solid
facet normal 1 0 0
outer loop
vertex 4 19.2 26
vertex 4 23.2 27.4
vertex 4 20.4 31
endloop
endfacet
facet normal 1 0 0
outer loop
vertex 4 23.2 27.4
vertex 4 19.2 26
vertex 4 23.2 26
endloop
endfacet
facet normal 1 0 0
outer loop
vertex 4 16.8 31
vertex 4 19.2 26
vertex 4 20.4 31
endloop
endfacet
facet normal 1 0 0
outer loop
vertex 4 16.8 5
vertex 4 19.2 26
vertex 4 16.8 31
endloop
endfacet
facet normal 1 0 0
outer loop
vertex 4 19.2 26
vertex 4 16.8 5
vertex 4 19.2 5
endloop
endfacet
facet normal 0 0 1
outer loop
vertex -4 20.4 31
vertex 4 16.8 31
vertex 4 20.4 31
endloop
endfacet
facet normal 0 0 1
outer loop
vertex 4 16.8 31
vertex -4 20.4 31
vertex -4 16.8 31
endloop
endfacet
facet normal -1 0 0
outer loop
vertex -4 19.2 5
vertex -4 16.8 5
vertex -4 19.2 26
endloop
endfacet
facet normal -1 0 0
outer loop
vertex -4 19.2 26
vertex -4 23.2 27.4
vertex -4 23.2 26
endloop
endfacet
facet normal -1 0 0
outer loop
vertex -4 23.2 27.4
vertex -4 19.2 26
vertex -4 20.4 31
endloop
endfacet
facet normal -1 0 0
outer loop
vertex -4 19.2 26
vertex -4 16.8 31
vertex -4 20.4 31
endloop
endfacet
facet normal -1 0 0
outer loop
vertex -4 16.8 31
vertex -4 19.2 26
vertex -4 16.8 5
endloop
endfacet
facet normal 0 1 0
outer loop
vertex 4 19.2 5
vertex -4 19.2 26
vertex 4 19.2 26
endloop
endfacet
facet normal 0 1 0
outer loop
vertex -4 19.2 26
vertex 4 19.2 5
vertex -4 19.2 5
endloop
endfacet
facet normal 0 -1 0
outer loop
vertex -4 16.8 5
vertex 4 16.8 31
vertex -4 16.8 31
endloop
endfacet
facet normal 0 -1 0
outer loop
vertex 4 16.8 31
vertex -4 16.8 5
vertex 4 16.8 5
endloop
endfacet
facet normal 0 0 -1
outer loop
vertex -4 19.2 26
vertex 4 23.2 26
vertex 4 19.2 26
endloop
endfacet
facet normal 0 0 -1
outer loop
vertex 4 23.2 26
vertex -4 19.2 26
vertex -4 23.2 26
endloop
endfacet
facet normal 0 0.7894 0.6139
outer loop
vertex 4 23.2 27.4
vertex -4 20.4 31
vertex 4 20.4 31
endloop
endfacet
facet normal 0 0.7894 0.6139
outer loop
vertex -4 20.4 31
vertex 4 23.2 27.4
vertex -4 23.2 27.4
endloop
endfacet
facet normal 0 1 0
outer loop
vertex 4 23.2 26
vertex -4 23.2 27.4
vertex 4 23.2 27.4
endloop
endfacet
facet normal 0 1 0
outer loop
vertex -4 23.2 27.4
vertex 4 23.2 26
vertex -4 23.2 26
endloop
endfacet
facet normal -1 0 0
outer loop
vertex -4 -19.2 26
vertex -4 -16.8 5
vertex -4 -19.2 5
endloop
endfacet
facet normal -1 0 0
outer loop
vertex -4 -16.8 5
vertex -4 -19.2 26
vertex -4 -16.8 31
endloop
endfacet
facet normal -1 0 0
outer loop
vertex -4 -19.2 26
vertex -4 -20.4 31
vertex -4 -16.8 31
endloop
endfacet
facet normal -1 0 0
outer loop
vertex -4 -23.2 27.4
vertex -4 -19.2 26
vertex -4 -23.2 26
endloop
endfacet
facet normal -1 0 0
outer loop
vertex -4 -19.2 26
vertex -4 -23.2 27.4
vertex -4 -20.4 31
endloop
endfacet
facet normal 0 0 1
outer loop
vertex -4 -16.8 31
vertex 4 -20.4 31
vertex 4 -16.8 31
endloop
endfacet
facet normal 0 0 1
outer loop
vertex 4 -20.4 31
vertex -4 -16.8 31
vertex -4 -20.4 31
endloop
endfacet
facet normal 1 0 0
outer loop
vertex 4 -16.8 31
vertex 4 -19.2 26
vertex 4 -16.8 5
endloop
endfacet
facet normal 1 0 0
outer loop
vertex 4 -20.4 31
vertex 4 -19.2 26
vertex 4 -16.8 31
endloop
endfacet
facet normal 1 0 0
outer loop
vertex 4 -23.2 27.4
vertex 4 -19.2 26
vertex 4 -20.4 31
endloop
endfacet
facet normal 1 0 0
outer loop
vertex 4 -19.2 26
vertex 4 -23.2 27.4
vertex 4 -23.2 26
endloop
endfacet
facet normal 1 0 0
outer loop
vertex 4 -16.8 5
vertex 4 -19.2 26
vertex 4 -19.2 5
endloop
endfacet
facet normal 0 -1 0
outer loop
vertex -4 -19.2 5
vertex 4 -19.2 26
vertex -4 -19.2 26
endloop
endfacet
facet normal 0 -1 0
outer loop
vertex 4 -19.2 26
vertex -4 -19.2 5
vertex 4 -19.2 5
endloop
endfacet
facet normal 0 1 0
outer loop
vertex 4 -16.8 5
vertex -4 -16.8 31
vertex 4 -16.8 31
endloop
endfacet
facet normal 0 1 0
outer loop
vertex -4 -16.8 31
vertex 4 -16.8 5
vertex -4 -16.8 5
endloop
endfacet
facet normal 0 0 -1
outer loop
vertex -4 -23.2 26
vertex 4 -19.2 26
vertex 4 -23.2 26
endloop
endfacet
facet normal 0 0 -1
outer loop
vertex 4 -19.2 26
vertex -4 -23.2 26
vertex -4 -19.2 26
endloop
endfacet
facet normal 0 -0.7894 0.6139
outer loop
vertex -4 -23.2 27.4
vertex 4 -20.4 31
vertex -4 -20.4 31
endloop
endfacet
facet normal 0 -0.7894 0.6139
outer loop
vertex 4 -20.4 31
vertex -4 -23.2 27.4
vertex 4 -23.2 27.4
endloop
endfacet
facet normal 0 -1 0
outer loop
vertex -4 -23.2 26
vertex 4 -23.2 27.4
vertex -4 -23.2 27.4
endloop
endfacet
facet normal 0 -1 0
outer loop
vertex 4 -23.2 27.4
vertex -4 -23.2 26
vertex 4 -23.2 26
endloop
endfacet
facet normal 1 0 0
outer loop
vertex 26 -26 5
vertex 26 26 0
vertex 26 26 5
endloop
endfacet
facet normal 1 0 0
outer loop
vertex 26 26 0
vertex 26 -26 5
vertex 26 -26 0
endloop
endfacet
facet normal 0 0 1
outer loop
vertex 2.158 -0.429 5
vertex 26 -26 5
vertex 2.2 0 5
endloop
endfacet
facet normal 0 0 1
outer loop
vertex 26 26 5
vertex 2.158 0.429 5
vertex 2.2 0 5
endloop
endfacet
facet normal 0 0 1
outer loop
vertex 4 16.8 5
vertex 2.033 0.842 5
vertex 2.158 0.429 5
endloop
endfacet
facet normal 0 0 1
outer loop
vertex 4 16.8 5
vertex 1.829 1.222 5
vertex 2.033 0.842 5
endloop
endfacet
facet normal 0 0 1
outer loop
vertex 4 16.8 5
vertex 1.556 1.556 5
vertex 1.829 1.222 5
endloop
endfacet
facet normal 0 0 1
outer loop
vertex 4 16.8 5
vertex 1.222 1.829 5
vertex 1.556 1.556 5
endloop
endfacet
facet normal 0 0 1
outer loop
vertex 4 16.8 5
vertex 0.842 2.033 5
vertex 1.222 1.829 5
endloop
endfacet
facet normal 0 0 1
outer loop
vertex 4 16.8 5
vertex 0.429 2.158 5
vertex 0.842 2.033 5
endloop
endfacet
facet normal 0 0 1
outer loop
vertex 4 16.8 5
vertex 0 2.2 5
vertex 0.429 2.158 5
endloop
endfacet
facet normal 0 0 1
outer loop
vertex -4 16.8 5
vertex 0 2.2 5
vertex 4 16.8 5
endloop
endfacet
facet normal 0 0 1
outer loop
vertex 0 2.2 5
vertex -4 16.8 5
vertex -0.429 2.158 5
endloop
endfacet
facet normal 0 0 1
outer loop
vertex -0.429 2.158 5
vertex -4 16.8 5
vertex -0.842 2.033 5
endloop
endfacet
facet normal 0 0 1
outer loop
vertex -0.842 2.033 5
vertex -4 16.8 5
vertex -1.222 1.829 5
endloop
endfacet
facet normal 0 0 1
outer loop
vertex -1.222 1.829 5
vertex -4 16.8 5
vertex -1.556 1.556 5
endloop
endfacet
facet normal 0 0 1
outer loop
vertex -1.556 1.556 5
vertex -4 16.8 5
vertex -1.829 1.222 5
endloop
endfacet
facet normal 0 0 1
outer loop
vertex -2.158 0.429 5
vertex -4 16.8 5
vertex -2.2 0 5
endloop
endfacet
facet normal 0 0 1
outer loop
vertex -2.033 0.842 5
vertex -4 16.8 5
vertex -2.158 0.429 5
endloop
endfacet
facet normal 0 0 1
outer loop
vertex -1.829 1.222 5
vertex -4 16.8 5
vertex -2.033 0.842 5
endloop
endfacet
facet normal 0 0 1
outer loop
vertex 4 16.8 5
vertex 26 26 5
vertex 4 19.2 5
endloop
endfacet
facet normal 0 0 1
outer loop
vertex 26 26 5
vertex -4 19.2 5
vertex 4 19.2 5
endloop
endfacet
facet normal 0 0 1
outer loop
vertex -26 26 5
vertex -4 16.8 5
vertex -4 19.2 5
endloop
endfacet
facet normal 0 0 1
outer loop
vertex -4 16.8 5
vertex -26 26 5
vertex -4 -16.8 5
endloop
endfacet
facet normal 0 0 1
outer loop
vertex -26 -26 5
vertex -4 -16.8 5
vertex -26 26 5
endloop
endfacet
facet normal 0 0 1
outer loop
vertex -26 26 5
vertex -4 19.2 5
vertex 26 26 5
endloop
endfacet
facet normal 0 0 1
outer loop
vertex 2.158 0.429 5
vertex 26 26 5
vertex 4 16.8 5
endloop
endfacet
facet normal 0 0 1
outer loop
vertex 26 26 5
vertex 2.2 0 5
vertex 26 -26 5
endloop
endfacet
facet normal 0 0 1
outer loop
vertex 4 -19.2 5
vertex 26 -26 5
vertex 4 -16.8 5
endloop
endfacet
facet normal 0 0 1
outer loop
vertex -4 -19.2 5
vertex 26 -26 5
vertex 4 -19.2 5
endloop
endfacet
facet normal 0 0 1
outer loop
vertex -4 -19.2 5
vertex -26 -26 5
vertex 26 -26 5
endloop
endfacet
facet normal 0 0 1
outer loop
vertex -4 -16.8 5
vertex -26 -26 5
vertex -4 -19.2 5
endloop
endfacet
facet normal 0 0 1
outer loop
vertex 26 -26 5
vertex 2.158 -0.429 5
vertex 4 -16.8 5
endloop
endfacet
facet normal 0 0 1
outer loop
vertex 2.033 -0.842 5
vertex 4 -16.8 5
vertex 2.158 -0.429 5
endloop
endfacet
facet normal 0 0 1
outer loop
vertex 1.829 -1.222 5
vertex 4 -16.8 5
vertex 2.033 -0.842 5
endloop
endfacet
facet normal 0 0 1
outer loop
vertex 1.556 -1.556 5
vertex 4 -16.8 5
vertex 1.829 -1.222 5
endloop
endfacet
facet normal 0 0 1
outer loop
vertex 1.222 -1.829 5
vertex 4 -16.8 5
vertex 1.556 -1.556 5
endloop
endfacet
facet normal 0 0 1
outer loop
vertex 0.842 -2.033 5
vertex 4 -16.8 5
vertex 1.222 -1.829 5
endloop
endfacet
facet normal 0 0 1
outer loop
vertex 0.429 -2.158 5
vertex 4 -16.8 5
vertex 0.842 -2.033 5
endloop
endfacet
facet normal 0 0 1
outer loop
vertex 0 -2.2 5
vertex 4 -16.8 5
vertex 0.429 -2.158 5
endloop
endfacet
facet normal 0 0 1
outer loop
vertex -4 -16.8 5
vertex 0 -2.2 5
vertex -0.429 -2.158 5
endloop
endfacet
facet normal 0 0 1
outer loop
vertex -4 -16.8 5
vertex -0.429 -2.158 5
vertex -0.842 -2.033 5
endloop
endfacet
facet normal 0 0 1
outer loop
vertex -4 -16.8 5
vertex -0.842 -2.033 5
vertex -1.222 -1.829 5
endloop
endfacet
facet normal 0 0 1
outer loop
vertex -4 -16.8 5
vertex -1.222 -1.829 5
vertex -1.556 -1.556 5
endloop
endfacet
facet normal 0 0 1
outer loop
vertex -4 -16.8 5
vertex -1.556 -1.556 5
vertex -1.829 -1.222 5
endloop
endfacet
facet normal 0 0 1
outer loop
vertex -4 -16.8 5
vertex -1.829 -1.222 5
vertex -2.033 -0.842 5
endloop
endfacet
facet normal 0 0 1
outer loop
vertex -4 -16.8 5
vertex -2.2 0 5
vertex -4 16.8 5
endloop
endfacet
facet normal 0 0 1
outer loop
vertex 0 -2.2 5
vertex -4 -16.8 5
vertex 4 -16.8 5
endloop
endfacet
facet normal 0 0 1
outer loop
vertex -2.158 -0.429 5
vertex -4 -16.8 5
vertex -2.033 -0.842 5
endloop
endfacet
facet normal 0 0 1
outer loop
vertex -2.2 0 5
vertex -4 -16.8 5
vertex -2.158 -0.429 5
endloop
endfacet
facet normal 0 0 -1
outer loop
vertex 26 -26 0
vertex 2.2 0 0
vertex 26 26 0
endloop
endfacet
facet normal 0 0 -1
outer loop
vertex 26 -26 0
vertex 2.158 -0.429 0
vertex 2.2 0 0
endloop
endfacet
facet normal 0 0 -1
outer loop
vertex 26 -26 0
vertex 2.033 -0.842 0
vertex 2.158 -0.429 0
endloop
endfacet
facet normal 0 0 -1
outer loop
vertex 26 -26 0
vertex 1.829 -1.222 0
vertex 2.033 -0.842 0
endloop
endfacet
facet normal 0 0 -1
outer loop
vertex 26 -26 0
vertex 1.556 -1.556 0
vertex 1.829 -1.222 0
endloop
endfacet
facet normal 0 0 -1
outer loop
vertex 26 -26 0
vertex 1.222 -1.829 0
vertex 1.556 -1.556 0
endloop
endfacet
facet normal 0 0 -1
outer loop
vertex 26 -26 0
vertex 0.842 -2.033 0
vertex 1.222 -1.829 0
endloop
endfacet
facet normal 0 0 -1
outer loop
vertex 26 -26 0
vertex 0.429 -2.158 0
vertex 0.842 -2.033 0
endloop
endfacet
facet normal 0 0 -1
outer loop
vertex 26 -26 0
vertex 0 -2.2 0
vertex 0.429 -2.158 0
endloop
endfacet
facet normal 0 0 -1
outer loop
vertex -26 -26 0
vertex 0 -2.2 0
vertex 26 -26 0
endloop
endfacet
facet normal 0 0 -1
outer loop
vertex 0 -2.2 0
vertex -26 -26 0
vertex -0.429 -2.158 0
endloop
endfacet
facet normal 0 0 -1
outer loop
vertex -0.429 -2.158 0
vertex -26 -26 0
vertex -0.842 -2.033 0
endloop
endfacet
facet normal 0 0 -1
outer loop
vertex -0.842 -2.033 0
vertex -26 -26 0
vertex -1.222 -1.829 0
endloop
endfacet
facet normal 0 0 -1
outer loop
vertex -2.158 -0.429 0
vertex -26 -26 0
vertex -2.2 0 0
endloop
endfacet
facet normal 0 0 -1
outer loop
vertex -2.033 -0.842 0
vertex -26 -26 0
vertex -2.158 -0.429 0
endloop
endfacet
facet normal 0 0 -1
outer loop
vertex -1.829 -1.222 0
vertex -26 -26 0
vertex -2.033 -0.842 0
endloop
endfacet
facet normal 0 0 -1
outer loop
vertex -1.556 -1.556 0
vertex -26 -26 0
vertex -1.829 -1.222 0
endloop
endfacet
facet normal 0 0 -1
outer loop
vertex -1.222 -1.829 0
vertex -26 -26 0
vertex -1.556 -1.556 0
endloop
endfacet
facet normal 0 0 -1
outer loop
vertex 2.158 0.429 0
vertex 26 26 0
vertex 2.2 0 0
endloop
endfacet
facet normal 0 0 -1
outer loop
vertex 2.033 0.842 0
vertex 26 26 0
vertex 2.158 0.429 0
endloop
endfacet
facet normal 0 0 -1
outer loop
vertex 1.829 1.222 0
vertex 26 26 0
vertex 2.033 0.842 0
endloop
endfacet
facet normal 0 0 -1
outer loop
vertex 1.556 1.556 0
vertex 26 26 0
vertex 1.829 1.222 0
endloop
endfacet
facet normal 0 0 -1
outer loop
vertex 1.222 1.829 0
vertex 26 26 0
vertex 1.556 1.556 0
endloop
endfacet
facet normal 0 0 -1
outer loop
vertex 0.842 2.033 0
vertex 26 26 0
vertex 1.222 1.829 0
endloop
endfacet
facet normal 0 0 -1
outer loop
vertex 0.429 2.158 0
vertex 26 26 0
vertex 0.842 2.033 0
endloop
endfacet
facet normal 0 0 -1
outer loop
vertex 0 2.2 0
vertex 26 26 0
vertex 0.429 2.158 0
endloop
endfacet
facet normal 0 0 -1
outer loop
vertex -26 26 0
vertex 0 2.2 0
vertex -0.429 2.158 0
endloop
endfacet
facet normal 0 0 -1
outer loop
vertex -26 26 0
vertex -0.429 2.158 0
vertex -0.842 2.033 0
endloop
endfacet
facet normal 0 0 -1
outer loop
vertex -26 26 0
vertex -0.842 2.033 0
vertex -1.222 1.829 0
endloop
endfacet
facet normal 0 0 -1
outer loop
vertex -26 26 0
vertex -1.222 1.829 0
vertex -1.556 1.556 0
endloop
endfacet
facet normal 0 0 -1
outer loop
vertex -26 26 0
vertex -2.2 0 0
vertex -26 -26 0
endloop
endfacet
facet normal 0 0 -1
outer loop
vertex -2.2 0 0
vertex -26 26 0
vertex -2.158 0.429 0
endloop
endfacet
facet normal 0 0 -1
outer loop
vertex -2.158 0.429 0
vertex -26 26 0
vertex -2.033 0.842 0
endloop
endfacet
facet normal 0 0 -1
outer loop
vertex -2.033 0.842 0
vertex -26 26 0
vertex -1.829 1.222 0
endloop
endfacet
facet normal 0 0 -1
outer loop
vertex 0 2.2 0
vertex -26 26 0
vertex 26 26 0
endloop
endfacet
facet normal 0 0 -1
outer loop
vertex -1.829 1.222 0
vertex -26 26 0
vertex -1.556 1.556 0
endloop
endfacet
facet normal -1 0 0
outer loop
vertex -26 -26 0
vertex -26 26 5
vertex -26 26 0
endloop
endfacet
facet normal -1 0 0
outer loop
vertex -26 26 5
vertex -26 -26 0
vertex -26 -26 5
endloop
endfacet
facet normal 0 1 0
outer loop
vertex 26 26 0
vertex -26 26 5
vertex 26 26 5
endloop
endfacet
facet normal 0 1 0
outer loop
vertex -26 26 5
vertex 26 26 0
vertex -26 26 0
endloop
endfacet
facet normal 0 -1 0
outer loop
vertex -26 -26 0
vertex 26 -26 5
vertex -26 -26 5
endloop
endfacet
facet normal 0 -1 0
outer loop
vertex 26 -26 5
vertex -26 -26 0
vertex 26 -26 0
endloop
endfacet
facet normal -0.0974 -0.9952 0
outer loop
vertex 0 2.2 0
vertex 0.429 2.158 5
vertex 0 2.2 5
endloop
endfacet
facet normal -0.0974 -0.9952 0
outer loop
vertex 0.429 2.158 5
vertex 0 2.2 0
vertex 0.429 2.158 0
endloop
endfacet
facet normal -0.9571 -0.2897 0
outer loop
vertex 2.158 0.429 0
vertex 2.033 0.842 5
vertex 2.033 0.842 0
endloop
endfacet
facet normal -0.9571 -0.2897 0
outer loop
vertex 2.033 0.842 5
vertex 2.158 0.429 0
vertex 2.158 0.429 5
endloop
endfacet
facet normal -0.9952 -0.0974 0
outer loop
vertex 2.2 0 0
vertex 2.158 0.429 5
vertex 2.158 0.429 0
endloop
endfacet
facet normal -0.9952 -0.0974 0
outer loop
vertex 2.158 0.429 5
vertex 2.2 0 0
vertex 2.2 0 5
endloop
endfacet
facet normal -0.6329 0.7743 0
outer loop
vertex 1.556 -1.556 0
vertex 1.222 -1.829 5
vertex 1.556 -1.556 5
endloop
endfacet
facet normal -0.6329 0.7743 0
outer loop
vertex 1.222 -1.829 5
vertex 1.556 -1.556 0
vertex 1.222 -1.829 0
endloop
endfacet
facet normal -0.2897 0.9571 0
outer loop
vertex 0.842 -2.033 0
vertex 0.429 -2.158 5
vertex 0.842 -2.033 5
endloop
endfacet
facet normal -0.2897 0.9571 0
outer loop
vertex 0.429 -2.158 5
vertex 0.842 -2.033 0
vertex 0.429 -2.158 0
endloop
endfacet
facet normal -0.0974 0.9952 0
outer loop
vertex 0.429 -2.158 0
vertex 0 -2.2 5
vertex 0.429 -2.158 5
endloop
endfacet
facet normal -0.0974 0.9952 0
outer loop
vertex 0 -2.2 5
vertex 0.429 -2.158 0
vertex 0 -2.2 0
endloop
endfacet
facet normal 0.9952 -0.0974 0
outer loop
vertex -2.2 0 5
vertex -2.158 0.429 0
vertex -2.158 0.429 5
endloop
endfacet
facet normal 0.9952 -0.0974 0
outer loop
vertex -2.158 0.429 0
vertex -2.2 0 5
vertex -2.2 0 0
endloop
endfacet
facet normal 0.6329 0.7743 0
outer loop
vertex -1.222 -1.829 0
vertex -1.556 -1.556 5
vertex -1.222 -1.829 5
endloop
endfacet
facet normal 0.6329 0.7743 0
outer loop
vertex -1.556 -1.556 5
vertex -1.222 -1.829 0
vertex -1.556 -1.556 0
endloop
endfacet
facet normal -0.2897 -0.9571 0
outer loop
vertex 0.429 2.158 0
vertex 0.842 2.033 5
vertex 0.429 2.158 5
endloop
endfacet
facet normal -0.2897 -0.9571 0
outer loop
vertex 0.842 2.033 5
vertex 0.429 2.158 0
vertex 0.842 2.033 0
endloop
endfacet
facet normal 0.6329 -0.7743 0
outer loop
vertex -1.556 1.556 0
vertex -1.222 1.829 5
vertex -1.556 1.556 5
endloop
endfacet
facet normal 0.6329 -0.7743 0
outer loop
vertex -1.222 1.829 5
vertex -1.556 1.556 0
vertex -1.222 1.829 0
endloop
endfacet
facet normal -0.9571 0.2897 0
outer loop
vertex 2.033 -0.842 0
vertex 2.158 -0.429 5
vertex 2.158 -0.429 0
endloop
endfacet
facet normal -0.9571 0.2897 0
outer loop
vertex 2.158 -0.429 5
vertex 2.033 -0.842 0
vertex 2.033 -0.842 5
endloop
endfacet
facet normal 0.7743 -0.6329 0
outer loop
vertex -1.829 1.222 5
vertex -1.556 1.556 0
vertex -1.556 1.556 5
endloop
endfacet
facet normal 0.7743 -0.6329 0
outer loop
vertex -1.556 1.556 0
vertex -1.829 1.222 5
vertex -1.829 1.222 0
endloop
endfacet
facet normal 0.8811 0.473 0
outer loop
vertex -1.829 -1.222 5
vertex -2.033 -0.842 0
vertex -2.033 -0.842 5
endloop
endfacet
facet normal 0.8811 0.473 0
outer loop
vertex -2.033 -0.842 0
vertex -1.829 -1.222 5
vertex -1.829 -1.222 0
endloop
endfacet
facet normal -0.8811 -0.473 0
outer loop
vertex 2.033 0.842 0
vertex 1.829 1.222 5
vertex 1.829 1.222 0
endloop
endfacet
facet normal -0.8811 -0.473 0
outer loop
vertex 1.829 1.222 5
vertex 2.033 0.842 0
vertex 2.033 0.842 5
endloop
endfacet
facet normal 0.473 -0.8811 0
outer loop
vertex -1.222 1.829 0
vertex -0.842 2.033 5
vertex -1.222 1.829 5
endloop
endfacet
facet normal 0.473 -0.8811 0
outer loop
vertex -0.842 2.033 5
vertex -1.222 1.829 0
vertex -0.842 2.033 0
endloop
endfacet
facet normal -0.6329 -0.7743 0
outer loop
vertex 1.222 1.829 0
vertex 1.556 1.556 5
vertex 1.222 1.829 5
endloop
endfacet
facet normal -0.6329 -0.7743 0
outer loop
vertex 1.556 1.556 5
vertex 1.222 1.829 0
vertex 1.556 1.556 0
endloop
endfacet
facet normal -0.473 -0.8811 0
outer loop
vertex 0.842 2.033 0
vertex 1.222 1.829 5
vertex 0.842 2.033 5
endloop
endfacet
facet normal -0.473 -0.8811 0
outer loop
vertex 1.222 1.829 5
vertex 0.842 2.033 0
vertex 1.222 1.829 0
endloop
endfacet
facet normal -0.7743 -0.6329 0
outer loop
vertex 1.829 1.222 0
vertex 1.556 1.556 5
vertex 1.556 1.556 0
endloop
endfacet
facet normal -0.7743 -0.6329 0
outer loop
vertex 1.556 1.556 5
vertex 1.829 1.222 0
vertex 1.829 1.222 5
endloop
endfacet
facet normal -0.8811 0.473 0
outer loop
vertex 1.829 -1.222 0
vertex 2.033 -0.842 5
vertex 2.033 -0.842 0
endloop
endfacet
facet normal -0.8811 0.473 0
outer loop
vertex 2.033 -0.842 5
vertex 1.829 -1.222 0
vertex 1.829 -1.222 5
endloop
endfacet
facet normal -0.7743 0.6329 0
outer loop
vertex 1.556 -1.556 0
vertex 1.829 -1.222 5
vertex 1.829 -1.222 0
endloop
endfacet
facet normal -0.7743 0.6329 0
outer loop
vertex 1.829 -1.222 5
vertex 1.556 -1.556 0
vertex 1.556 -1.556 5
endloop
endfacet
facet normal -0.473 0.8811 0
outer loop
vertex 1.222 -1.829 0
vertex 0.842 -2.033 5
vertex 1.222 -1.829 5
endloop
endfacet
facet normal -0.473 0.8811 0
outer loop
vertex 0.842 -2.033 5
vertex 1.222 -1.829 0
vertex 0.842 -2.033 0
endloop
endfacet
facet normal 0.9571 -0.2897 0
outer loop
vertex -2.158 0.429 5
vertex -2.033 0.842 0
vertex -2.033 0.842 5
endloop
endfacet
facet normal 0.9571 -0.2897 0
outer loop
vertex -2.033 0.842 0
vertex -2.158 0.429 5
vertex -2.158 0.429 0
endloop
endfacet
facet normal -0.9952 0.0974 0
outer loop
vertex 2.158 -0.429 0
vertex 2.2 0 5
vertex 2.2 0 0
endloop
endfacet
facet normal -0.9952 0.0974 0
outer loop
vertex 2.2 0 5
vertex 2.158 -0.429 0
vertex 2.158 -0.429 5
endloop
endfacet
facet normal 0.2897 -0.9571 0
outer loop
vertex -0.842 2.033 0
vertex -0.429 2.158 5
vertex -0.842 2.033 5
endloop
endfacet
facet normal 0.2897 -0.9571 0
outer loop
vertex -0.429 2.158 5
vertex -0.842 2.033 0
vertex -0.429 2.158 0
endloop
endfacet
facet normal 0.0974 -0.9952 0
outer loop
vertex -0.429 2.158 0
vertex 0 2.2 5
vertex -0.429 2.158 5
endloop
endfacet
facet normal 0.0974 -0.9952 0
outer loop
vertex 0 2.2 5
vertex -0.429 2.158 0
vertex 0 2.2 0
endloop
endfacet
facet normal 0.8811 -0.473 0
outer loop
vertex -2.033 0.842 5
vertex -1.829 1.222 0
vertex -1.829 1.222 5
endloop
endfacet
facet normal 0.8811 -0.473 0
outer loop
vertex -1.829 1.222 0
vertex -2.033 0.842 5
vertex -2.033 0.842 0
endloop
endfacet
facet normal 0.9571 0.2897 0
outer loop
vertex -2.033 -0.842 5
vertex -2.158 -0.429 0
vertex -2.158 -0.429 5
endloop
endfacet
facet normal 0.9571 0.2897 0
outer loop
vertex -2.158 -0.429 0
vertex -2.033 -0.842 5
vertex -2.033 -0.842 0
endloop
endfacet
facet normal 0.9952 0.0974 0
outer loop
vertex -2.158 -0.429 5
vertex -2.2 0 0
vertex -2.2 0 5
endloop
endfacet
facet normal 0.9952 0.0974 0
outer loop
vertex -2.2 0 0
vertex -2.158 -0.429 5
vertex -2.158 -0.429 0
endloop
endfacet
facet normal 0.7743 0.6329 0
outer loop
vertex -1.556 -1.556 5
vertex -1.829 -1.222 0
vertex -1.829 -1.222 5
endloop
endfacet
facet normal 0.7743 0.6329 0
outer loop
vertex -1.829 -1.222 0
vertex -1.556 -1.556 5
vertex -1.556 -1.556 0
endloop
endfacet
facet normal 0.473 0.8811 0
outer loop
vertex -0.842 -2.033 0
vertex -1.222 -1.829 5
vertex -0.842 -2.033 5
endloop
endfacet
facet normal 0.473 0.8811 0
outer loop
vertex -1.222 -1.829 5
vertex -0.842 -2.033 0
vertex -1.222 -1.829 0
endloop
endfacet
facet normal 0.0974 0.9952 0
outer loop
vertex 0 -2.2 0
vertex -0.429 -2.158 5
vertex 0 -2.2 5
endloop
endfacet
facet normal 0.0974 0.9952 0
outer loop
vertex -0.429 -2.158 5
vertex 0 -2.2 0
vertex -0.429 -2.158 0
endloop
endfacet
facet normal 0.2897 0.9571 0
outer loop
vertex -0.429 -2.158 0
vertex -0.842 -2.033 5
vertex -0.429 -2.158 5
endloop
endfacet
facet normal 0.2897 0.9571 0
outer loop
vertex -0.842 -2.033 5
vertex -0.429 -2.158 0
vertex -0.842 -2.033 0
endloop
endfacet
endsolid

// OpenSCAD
$fn = 32;

// ----------------------------------------------------------------------
// Snap-fit latch: 2 arms, 26 mm tall, 4.2 mm undercut hooks
// ----------------------------------------------------------------------

// --- parameters (mm) ---
base_d = 52;              // base plate depth
base_h = 5;               // base plate thickness
span = 36;                // distance between opposite arms
arm_t = 2.4;              // arm thickness
arm_d = 8;                // arm width
height = 26;              // free arm length
head_len = 4.2;           // hook reach
head_h = 5;               // hook height
lead = 1.4;               // lead-in ramp thickness
bore_d = 4.4;             // base fixing bore
top_z = 31;               // height of the arm tips above the base

arms = 2;

difference() {
  union() {
    /* base plate, centred on the arm ring */
    translate([-26, -26, 0]) cube([base_d, base_d, base_h]);
    for (a = [0 : 360 / arms : 359]) rotate([0, 0, a]) {
    /* arm, sunk 0.5 mm into the base */
    translate([-arm_d / 2, span / 2 - arm_t / 2, base_h - 0.5]) cube([arm_d, arm_t, height + 0.5]);
    /* hook: a convex hull of a tall inner block and a thin outer lip
       gives a flat undercut below and a lead-in ramp on top */
    hull() {
      translate([-arm_d / 2, span / 2 + arm_t / 2 - 0.6, top_z - head_h]) cube([arm_d, lead + 0.4, head_h]);
      translate([-arm_d / 2, span / 2 + arm_t / 2 - 0.2, top_z - head_h]) cube([arm_d, head_len, lead]);
    }
    }
  }
  translate([0, 0, -2.5]) cylinder(h = base_h + 5, d = bore_d);
}
